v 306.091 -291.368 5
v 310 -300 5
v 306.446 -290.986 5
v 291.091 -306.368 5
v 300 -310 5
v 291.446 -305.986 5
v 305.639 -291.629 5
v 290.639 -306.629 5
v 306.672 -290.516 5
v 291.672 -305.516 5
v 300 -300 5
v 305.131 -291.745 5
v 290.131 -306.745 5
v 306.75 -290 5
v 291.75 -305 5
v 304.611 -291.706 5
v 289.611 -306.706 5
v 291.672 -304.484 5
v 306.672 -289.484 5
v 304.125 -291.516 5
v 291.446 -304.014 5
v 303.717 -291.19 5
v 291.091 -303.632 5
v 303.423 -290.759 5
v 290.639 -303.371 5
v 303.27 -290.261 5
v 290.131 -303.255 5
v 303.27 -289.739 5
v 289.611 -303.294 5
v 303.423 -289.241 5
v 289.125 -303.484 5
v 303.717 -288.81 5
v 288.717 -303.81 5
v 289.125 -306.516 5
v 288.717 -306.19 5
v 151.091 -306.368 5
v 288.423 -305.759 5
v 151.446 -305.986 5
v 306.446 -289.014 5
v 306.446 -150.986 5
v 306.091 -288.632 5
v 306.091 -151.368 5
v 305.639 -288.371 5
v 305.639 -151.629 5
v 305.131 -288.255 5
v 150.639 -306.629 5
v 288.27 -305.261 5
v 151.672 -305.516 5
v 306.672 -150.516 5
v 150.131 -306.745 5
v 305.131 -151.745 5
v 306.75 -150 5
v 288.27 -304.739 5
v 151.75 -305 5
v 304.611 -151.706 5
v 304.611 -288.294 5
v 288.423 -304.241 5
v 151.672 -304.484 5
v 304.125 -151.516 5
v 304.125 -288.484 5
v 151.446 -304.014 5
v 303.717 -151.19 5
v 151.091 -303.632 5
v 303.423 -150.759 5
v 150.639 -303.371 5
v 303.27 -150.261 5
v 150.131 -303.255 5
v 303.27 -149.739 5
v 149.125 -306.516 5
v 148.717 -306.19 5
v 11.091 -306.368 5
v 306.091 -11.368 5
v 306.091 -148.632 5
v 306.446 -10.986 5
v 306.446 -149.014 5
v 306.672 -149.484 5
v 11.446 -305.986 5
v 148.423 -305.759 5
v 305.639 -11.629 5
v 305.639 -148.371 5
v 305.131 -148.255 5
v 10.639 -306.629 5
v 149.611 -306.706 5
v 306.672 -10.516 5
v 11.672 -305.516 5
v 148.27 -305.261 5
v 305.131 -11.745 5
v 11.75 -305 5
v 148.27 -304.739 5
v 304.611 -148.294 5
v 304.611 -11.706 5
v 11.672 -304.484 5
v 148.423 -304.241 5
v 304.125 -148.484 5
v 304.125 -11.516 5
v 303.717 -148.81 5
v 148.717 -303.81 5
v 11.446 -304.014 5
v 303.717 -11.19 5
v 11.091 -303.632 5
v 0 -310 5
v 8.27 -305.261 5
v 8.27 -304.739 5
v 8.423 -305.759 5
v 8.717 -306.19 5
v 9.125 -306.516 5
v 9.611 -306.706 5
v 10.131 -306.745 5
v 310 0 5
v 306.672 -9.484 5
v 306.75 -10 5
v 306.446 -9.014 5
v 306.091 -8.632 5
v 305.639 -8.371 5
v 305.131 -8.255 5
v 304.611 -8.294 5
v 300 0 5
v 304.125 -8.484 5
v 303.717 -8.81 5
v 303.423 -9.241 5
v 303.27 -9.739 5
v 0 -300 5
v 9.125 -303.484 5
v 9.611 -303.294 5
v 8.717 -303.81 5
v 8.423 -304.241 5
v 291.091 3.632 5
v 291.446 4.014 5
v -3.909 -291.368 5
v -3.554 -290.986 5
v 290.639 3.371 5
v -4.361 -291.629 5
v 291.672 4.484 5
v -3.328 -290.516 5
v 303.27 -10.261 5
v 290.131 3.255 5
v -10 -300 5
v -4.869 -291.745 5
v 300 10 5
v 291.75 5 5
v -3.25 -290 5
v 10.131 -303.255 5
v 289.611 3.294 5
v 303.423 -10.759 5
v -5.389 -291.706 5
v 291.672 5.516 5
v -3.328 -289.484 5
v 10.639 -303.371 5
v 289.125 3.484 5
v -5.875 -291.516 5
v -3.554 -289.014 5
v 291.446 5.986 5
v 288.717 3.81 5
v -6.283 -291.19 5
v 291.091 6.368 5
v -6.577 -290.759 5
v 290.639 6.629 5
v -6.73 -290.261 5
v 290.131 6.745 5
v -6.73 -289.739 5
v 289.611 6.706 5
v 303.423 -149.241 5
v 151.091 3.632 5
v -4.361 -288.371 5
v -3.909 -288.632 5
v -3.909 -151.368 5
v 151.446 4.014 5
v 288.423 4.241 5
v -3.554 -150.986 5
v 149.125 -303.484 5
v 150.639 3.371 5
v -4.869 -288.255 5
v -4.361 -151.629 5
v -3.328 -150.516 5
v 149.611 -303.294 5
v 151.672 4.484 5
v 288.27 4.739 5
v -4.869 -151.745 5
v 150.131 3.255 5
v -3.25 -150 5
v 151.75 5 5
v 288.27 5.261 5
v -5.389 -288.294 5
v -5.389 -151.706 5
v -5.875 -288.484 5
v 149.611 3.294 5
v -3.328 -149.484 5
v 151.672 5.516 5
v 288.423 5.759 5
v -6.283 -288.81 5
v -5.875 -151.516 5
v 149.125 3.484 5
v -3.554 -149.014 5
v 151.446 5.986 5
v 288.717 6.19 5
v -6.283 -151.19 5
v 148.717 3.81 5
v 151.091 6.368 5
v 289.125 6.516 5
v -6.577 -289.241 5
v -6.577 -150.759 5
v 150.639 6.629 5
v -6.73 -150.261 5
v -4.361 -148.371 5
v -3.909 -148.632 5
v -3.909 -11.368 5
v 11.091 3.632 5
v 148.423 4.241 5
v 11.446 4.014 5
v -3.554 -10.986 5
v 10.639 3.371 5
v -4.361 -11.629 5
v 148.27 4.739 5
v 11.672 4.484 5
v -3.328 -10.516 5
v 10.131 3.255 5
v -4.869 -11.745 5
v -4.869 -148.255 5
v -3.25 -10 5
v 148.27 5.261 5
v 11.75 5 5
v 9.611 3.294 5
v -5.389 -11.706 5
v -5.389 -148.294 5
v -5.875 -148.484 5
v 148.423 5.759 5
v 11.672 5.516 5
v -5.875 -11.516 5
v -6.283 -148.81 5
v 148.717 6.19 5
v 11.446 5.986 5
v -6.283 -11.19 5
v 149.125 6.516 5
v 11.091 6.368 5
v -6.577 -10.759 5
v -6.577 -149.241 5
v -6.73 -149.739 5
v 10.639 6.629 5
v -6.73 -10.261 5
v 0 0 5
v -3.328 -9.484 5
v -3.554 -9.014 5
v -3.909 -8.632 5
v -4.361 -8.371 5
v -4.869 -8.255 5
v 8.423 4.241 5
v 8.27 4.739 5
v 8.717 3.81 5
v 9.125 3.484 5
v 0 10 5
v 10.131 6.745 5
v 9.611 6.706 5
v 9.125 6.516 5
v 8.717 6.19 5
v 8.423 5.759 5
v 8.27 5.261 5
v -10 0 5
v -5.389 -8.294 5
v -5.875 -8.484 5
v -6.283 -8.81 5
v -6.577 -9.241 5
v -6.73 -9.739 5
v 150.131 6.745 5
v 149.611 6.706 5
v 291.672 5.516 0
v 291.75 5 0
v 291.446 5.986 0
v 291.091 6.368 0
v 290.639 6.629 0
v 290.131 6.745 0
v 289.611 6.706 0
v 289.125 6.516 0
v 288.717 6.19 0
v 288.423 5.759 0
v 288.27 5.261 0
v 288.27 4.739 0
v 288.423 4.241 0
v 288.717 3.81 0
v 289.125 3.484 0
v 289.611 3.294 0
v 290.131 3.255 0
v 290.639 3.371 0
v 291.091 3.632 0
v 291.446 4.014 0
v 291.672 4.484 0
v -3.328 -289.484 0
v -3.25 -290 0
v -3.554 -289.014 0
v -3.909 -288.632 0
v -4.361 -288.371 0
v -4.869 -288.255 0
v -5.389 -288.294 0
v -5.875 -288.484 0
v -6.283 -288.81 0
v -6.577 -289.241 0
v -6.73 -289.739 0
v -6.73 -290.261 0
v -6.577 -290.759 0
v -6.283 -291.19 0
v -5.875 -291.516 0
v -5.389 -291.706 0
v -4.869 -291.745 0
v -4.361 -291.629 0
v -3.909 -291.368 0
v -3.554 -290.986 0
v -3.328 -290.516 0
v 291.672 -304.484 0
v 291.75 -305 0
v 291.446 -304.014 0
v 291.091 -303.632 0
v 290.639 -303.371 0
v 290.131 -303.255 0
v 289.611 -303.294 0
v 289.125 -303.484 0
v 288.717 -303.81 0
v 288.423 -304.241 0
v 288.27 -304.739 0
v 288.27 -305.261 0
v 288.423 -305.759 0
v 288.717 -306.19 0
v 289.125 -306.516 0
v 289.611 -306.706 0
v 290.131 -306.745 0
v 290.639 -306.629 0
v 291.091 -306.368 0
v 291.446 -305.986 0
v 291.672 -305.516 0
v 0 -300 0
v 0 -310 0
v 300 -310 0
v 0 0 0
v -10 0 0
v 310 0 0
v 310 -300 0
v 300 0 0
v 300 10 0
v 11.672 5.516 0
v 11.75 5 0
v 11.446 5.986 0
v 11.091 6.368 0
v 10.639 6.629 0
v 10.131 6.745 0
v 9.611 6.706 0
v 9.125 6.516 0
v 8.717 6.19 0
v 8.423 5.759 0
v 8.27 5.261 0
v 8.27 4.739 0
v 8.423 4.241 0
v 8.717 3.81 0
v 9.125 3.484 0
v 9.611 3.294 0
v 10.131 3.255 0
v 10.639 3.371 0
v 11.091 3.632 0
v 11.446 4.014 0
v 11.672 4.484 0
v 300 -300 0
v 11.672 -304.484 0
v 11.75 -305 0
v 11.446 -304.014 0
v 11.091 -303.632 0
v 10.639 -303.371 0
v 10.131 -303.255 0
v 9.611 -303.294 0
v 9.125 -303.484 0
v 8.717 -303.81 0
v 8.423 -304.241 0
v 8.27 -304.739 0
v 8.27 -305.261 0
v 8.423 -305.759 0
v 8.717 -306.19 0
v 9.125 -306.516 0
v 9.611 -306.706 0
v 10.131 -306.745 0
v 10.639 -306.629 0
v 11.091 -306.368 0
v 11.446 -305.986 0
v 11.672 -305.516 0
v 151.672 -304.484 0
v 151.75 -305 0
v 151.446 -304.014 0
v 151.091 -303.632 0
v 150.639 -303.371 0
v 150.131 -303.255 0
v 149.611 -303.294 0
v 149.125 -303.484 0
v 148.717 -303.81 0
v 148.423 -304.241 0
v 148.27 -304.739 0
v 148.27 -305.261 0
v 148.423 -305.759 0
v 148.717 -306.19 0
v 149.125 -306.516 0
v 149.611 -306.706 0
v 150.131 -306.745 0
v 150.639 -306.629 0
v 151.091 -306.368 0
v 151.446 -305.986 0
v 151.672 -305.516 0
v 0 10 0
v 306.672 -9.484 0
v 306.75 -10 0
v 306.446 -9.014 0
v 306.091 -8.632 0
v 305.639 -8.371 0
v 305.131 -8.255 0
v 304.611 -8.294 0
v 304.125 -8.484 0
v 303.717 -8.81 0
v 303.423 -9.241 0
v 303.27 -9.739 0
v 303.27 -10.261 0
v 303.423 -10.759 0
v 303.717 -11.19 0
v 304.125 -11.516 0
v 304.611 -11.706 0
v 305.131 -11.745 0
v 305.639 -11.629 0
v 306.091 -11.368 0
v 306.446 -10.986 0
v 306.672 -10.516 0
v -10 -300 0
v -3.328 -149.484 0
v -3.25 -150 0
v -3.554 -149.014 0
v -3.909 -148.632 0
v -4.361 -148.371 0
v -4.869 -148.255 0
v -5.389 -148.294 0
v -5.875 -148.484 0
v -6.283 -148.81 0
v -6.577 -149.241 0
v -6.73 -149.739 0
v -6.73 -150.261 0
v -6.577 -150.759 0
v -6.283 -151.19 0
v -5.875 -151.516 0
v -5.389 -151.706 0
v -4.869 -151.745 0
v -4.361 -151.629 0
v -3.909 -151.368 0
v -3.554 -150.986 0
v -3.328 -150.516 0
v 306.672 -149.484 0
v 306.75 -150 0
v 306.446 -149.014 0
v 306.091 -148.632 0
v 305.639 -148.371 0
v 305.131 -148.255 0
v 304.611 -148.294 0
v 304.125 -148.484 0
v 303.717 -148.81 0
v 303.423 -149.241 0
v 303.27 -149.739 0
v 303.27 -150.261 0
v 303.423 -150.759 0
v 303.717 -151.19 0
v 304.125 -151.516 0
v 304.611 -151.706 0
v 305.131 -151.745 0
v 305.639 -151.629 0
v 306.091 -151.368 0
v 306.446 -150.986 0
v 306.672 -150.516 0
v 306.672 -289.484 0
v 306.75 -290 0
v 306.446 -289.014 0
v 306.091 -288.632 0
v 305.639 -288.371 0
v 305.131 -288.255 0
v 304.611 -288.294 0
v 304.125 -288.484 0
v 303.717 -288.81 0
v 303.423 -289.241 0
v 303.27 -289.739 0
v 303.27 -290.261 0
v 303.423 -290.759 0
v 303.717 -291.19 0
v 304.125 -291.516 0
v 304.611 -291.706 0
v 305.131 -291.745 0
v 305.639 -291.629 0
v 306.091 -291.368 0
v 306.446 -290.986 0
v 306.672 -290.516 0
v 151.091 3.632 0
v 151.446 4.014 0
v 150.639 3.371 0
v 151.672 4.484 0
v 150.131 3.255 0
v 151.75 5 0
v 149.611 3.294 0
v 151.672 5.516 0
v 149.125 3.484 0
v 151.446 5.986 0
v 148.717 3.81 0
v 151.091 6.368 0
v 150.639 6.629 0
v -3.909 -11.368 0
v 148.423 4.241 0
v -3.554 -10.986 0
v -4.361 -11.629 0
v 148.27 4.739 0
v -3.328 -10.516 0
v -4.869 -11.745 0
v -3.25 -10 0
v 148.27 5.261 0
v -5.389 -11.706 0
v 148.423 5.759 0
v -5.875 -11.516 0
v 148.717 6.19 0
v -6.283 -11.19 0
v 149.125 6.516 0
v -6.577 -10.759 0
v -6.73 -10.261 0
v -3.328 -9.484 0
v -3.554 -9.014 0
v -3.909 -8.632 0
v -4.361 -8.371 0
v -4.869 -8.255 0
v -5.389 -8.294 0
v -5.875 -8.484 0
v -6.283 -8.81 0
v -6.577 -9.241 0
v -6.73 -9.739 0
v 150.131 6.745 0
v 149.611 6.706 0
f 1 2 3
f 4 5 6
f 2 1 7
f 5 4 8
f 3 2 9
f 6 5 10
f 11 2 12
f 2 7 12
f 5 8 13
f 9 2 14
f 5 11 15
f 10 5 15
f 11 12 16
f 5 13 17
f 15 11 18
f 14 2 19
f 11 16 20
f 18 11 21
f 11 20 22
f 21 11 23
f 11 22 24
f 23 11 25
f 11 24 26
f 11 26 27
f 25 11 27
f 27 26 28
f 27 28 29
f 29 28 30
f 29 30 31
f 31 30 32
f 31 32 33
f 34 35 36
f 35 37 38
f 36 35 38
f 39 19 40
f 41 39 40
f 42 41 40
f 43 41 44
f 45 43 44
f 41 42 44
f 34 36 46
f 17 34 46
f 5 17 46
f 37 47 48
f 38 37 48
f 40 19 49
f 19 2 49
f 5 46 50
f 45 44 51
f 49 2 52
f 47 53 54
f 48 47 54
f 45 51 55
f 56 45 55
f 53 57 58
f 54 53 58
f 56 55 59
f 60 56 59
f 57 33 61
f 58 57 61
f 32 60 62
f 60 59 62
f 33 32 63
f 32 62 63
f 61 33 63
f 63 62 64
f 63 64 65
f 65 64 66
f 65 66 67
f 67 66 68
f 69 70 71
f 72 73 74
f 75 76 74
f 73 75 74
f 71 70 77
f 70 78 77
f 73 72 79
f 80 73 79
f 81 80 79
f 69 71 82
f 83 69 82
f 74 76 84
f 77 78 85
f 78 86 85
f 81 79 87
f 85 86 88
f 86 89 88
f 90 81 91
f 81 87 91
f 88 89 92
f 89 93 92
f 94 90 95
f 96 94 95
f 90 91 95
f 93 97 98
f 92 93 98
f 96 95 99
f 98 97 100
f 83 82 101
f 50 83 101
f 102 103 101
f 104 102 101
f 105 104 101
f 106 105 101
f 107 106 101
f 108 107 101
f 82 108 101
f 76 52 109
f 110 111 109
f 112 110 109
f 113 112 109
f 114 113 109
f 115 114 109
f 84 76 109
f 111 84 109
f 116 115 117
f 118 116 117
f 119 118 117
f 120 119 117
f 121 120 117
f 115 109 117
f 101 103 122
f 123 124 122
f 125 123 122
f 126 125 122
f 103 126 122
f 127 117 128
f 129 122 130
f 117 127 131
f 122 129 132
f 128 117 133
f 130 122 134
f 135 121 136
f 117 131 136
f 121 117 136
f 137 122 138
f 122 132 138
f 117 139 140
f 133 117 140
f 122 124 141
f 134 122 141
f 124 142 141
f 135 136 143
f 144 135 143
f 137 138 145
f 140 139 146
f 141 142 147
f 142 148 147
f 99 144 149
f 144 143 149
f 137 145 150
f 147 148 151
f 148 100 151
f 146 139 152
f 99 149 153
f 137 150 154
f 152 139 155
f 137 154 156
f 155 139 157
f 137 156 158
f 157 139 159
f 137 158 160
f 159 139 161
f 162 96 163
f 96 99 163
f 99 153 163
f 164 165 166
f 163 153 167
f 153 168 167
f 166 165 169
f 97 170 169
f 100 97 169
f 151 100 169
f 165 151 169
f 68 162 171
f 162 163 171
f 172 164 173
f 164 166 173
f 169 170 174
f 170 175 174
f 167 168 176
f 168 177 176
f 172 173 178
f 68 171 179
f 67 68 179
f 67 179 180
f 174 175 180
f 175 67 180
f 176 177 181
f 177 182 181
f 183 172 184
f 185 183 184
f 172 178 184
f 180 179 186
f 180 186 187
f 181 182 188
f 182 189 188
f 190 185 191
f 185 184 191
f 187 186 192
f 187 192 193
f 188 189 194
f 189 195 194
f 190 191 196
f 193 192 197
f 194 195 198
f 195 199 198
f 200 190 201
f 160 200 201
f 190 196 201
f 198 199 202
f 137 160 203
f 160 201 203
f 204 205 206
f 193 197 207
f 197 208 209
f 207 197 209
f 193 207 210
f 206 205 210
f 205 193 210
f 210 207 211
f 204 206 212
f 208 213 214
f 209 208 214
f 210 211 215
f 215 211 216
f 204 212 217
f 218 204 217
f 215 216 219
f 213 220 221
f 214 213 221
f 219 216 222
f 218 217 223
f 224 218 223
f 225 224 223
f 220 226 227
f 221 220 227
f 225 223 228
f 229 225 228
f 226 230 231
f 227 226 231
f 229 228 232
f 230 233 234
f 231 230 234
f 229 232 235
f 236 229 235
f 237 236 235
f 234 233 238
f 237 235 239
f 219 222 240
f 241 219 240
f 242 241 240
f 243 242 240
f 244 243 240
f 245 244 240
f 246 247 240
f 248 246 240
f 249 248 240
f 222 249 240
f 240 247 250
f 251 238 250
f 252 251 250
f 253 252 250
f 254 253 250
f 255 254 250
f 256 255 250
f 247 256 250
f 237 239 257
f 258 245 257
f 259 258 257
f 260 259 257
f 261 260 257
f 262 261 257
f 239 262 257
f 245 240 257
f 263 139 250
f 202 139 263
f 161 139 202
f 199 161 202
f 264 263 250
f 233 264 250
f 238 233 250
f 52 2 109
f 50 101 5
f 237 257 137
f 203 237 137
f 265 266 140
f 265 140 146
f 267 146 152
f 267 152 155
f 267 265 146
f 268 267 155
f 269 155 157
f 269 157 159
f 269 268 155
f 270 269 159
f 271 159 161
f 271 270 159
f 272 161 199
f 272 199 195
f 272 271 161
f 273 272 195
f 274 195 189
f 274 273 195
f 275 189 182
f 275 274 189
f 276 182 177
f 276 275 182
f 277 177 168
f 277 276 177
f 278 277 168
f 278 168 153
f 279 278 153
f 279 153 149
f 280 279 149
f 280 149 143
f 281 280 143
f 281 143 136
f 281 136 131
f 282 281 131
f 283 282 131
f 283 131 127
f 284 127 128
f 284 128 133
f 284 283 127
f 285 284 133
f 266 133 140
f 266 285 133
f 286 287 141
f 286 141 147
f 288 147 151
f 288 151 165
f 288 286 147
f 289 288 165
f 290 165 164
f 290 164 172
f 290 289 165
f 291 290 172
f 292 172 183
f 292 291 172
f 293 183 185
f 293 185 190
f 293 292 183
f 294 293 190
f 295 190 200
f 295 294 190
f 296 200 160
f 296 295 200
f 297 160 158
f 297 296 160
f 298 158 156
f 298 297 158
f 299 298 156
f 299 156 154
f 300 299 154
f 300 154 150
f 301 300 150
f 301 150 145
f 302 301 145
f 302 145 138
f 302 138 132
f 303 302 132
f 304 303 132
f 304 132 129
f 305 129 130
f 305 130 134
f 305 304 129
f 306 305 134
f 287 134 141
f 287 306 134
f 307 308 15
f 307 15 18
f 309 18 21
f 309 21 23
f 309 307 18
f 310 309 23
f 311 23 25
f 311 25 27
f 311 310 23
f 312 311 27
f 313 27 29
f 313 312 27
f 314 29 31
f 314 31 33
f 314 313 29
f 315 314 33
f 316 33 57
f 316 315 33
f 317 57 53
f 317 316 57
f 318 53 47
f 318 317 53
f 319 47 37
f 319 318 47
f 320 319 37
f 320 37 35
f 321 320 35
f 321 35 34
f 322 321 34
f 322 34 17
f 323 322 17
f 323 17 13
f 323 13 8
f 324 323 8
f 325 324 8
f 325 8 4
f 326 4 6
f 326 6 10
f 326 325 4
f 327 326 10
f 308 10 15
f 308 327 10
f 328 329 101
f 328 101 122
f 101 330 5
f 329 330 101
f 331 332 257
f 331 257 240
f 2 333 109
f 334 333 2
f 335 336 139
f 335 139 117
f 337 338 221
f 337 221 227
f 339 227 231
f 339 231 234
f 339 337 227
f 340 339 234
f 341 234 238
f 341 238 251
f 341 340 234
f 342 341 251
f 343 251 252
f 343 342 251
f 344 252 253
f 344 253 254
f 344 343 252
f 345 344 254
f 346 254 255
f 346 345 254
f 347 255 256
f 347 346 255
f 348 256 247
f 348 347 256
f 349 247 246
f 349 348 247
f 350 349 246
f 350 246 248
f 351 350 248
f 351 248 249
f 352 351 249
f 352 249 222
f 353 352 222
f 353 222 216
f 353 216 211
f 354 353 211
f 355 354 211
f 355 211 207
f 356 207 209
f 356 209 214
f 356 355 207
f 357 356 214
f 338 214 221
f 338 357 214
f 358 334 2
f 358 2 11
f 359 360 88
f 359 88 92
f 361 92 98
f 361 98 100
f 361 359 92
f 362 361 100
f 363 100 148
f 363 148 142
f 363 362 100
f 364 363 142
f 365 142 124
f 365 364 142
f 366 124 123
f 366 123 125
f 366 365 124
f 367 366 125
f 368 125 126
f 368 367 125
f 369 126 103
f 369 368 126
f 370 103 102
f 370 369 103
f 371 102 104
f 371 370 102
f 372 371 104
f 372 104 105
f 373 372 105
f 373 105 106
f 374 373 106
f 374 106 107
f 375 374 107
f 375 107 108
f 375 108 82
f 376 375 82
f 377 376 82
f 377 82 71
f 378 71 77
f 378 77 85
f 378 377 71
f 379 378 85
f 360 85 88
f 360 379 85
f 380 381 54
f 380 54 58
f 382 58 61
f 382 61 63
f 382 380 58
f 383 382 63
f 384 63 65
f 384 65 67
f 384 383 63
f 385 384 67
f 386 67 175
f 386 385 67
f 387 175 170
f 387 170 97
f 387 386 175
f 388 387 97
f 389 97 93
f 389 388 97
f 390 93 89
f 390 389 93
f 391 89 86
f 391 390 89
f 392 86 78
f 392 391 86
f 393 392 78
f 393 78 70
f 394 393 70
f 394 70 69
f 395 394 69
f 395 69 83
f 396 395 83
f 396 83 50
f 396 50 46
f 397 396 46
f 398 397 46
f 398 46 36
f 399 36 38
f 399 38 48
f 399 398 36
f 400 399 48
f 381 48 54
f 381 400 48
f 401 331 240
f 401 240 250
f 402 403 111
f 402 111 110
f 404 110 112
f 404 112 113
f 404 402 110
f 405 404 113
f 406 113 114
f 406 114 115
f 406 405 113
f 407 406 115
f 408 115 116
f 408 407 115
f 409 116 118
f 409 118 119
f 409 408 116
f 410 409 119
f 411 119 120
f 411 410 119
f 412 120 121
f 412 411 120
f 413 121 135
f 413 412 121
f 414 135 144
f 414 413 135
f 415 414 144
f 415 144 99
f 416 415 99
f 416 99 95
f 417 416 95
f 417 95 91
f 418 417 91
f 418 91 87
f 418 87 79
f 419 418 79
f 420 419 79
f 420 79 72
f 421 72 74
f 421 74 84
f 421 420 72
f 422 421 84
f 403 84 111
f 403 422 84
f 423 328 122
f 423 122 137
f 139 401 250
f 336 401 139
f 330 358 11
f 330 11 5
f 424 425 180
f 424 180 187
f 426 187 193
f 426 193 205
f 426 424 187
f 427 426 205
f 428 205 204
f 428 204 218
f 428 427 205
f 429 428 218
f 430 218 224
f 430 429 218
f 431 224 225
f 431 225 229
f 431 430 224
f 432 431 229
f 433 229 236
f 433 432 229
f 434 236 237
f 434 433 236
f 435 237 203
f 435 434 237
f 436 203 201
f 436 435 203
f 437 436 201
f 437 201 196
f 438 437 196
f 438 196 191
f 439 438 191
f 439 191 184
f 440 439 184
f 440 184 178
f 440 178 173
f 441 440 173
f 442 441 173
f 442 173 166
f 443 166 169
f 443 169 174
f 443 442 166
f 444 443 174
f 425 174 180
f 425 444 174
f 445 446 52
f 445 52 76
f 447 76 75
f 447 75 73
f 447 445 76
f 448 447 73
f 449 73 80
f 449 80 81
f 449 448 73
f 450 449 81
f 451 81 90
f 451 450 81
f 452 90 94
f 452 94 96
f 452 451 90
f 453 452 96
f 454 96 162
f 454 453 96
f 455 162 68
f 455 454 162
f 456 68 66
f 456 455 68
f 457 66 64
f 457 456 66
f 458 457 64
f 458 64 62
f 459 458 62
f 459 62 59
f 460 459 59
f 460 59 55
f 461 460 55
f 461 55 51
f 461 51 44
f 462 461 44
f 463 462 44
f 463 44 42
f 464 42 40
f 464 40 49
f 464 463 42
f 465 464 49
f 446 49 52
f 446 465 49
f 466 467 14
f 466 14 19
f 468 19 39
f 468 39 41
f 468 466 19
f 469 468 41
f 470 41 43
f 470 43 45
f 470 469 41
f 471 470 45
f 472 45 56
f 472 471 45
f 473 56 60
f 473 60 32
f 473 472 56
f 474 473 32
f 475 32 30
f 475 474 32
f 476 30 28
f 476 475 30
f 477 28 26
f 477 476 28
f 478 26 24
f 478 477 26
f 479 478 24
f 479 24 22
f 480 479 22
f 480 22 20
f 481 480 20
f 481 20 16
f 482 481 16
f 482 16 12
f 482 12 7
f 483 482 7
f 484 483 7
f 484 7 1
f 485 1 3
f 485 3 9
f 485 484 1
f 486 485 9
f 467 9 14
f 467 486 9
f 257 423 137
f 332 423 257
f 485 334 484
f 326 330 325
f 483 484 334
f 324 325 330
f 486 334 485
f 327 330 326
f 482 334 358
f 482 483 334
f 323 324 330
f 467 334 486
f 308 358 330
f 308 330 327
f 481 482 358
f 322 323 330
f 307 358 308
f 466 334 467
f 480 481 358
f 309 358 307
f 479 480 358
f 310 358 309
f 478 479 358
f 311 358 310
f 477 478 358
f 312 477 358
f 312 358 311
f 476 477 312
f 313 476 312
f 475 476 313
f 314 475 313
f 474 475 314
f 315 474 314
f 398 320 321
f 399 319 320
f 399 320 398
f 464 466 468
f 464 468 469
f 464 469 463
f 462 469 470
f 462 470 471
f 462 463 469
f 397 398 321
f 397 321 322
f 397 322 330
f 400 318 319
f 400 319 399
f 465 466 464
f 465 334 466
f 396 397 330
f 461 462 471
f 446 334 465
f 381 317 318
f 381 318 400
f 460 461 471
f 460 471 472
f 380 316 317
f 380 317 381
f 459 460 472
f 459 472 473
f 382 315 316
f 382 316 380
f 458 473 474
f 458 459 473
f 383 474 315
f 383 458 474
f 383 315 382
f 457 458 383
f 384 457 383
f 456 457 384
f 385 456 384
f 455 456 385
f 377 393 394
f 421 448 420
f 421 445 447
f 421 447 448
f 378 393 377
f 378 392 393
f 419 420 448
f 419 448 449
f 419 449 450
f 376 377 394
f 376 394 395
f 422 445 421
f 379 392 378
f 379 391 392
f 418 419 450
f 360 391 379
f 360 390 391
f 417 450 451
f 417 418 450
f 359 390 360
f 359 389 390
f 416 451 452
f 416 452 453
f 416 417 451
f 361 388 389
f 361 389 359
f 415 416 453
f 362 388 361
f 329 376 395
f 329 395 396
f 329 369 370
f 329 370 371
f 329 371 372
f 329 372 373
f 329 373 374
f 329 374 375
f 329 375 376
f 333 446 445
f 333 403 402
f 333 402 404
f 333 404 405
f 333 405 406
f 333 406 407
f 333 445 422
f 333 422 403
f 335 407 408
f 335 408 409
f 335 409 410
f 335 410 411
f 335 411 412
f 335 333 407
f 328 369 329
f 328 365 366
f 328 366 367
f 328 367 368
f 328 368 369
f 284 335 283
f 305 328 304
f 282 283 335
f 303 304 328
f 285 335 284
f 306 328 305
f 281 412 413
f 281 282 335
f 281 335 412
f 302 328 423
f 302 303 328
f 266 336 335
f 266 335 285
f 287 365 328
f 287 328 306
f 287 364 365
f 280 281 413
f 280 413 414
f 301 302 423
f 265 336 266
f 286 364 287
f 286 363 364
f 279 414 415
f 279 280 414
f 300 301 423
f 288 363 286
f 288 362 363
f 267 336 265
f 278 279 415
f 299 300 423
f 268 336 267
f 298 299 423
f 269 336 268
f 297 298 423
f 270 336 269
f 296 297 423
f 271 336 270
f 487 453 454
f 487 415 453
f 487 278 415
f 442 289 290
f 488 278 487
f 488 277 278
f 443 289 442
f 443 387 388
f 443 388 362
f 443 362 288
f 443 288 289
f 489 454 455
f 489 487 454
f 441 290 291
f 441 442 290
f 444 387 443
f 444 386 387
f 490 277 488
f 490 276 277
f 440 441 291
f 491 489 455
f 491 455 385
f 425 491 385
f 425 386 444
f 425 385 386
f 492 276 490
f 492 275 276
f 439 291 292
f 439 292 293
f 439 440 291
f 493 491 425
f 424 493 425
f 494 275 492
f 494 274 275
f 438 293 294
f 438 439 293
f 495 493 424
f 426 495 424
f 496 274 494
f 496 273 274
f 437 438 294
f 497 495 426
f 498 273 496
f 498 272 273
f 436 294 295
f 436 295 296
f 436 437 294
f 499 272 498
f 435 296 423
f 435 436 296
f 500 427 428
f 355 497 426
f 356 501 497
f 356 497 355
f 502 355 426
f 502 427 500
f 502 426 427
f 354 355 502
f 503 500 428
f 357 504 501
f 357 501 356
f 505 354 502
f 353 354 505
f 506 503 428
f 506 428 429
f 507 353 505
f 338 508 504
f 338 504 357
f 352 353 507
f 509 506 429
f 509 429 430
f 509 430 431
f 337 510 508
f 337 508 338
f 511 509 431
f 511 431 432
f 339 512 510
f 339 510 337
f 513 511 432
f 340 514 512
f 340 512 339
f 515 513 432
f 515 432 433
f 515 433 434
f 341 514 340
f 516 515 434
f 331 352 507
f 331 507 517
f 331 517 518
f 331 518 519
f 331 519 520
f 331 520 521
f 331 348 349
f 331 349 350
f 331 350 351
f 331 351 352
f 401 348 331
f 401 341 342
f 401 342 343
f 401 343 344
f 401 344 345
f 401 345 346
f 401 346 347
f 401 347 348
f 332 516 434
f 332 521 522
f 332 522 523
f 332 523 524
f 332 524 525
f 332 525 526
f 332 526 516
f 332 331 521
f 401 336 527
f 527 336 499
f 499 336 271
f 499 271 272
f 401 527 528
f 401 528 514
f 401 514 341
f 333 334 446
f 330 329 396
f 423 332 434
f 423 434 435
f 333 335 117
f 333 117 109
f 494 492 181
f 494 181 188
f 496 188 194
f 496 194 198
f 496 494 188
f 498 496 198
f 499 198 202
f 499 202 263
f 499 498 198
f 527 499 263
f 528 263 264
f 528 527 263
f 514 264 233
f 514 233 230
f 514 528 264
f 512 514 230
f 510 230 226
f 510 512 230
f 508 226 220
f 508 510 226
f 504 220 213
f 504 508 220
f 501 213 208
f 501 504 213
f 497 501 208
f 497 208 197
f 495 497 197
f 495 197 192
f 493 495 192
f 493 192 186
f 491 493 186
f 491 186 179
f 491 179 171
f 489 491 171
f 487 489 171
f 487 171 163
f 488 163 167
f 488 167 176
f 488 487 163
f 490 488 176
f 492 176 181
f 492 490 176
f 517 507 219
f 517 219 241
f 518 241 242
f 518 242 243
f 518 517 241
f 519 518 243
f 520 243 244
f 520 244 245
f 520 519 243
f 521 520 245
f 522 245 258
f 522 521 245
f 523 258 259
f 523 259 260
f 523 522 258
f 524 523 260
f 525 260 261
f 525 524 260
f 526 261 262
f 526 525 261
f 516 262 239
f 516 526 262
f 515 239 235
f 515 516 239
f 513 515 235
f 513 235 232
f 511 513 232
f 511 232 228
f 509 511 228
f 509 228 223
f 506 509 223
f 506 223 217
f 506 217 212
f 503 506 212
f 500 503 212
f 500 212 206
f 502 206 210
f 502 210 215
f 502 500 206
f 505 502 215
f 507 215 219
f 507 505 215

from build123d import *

# Parameters (mm, degrees)
SKETCH1_R           = 1.75
BOSS_EXTRUDE1_DEPTH = 5


with BuildPart() as part:
    # Sketch1 → Boss-Extrude1 (new body)
    with BuildSketch(Plane.XY):
        Polygon((0, 0), (0, 10), (300, 10), (300, 0), (310, 0), (310, -300), (300, -300), (300, -310), (0, -310), (0, -300), (-10, -300), (-10, 0), align=None)
        with Locations((10, 5)):
            Circle(SKETCH1_R, mode=Mode.SUBTRACT)
        with Locations((150, 5)):
            Circle(SKETCH1_R, mode=Mode.SUBTRACT)
        with Locations((290, 5)):
            Circle(SKETCH1_R, mode=Mode.SUBTRACT)
        with Locations((-5, -290)):
            Circle(SKETCH1_R, mode=Mode.SUBTRACT)
        with Locations((-5, -150)):
            Circle(SKETCH1_R, mode=Mode.SUBTRACT)
        with Locations((-5, -10)):
            Circle(SKETCH1_R, mode=Mode.SUBTRACT)
        with Locations((290, -305)):
            Circle(SKETCH1_R, mode=Mode.SUBTRACT)
        with Locations((150, -305)):
            Circle(SKETCH1_R, mode=Mode.SUBTRACT)
        with Locations((10, -305)):
            Circle(SKETCH1_R, mode=Mode.SUBTRACT)
        with Locations((305, -10)):
            Circle(SKETCH1_R, mode=Mode.SUBTRACT)
        with Locations((305, -150)):
            Circle(SKETCH1_R, mode=Mode.SUBTRACT)
        with Locations((305, -290)):
            Circle(SKETCH1_R, mode=Mode.SUBTRACT)
    extrude(amount=BOSS_EXTRUDE1_DEPTH)


solid = part.part
